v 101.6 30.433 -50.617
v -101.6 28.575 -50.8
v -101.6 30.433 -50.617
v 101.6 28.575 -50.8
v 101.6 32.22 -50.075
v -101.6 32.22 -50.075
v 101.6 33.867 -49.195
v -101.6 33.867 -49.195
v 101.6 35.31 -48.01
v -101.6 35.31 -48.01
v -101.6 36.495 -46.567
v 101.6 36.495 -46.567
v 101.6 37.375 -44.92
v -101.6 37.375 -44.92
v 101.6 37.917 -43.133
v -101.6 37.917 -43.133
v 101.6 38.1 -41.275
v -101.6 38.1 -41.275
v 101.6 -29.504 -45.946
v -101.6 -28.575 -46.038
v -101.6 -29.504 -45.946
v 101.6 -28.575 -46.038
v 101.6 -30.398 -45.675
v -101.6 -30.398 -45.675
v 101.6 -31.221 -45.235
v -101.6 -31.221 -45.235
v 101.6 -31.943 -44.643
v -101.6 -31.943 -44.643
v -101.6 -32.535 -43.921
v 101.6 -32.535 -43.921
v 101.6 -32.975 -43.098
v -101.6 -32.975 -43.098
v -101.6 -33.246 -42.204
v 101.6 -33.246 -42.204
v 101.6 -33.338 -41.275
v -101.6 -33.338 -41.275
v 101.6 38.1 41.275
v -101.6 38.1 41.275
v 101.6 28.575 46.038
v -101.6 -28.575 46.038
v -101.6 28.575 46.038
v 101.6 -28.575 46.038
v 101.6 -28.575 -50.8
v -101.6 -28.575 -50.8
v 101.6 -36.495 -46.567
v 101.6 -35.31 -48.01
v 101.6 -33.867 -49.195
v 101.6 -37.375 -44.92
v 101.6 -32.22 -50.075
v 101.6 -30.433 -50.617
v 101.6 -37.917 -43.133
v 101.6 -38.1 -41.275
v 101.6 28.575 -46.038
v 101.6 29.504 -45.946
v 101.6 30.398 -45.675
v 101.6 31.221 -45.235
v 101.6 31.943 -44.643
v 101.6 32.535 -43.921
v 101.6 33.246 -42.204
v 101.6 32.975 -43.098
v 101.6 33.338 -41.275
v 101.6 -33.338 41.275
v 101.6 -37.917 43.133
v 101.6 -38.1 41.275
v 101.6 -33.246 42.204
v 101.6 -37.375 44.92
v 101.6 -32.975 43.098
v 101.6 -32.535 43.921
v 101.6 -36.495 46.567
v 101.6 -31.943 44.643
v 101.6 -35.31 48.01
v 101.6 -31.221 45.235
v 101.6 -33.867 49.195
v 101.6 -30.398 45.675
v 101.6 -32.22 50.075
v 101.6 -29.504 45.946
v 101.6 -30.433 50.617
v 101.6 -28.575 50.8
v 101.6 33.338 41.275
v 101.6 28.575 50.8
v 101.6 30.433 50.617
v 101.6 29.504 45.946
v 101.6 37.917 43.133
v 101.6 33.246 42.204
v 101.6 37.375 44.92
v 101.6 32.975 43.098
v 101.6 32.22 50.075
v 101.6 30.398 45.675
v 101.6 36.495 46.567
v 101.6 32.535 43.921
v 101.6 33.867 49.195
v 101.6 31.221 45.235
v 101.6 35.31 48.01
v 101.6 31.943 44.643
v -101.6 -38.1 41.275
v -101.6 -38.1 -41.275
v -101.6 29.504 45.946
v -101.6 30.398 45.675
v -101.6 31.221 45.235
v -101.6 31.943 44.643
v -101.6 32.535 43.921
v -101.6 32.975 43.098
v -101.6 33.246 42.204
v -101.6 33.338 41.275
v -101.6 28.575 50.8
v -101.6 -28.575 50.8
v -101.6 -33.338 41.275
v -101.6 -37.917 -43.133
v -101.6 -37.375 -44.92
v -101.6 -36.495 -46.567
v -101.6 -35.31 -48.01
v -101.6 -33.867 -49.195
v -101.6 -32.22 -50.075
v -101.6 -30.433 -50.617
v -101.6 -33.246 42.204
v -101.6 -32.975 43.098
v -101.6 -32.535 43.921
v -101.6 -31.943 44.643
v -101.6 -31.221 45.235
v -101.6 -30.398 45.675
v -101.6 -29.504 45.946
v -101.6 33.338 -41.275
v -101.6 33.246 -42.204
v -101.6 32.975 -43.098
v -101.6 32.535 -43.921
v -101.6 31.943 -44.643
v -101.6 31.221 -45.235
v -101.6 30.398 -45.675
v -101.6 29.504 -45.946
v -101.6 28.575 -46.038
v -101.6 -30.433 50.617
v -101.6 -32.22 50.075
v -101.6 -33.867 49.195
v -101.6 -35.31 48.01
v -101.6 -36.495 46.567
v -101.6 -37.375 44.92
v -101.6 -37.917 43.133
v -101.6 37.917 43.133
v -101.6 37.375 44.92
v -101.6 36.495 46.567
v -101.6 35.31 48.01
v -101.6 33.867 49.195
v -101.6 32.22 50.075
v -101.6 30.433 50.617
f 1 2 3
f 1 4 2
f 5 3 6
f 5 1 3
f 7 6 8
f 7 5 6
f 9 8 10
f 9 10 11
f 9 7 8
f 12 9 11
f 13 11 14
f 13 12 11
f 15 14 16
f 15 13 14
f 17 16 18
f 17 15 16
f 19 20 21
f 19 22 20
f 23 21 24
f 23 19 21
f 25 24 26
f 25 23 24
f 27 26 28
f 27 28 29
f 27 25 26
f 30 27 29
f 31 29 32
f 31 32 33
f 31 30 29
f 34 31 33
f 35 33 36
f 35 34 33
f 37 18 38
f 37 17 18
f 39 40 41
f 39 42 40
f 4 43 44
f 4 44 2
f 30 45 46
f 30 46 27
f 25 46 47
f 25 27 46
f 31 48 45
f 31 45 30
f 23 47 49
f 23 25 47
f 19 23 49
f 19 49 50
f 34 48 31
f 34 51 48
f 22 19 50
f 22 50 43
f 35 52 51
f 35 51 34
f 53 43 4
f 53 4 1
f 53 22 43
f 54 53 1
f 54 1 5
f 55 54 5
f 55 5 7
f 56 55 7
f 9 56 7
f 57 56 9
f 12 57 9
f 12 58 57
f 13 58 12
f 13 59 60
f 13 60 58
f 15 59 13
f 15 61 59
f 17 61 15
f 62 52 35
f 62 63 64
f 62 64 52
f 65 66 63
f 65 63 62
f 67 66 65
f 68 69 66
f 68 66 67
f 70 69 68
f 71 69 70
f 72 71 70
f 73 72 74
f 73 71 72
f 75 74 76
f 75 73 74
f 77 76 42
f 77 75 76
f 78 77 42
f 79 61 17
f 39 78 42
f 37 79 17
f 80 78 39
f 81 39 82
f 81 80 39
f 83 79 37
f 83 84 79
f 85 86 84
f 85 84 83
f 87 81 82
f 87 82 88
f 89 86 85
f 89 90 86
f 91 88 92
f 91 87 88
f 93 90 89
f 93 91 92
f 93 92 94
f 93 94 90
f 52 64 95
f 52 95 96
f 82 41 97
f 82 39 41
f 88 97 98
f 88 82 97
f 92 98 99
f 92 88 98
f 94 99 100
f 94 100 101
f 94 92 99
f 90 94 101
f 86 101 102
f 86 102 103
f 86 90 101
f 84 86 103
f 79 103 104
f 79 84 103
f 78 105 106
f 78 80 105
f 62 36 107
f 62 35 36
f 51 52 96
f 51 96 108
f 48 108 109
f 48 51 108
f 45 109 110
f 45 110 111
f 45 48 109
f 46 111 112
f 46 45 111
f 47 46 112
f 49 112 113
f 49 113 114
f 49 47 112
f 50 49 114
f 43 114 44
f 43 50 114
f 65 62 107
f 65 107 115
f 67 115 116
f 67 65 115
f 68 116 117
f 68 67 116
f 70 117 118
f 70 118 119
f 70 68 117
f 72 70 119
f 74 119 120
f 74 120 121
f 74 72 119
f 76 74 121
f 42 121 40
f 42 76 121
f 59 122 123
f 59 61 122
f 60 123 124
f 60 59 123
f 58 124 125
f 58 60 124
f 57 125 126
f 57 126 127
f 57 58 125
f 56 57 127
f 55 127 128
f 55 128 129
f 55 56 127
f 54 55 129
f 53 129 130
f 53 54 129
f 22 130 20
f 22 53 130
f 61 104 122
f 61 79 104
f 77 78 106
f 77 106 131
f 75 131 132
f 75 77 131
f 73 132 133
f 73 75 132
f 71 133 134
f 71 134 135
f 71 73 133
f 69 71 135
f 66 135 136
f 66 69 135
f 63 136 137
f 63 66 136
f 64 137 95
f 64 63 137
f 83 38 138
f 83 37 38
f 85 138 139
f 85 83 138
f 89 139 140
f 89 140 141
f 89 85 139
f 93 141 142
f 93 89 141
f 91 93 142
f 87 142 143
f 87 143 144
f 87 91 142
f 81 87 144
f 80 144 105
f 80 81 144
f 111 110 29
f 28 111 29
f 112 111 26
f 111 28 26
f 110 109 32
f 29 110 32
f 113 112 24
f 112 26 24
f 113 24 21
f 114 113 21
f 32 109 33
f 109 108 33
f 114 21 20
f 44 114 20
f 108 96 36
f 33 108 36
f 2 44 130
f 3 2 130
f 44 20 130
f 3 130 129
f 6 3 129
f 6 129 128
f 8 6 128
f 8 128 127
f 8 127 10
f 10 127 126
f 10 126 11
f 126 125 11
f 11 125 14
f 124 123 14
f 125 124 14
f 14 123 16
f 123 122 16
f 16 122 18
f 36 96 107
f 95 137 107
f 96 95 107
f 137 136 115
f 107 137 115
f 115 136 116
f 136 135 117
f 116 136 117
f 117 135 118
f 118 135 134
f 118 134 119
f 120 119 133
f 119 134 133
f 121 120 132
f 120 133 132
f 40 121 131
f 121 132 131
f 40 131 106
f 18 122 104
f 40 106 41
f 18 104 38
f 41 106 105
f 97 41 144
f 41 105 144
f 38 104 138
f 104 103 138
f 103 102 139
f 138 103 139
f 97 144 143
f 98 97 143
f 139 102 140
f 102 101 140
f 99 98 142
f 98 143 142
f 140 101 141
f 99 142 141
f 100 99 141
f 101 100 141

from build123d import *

# Parameters (mm, degrees)
F2_DEPTH = 101.6


# Not quite as in the source:
# - a variable given as a bare number and used for a length is read in inches; the dataset says mm whatever the document's units were


with BuildPart() as f2:
    # F1 (on Right) → F2 (new body, symmetric)
    with BuildSketch(Plane.YZ):
        with BuildLine():
            Line((28.575, 50.8), (-28.575, 50.8))
            ThreePointArc((-28.575, 50.8), (-35.3101920908, 48.0101920908), (-38.1, 41.275))
            Line((-38.1, 41.275), (-38.1, -41.275))
            ThreePointArc((-38.1, -41.275), (-35.3101920908, -48.0101920908), (-28.575, -50.8))
            Line((-28.575, -50.8), (28.575, -50.8))
            ThreePointArc((28.575, -50.8), (35.3101920908, -48.0101920908), (38.1, -41.275))
            Line((38.1, -41.275), (38.1, 41.275))
            ThreePointArc((38.1, 41.275), (35.3101920908, 48.0101920908), (28.575, 50.8))
        make_face()
        with BuildLine():
            ThreePointArc((-33.3375, 41.275), (-31.9425960454, 44.6425960454), (-28.575, 46.0375))
            Line((-28.575, 46.0375), (28.575, 46.0375))
            ThreePointArc((28.575, 46.0375), (31.9425960454, 44.6425960454), (33.3375, 41.275))
            Line((33.3375, 41.275), (33.3375, -41.275))
            ThreePointArc((33.3375, -41.275), (31.9425960454, -44.6425960454), (28.575, -46.0375))
            Line((28.575, -46.0375), (-28.575, -46.0375))
            ThreePointArc((-28.575, -46.0375), (-31.9425960454, -44.6425960454), (-33.3375, -41.275))
            Line((-33.3375, -41.275), (-33.3375, 41.275))
        make_face(mode=Mode.SUBTRACT)
    extrude(amount=F2_DEPTH, both=True)


solid = f2.part
